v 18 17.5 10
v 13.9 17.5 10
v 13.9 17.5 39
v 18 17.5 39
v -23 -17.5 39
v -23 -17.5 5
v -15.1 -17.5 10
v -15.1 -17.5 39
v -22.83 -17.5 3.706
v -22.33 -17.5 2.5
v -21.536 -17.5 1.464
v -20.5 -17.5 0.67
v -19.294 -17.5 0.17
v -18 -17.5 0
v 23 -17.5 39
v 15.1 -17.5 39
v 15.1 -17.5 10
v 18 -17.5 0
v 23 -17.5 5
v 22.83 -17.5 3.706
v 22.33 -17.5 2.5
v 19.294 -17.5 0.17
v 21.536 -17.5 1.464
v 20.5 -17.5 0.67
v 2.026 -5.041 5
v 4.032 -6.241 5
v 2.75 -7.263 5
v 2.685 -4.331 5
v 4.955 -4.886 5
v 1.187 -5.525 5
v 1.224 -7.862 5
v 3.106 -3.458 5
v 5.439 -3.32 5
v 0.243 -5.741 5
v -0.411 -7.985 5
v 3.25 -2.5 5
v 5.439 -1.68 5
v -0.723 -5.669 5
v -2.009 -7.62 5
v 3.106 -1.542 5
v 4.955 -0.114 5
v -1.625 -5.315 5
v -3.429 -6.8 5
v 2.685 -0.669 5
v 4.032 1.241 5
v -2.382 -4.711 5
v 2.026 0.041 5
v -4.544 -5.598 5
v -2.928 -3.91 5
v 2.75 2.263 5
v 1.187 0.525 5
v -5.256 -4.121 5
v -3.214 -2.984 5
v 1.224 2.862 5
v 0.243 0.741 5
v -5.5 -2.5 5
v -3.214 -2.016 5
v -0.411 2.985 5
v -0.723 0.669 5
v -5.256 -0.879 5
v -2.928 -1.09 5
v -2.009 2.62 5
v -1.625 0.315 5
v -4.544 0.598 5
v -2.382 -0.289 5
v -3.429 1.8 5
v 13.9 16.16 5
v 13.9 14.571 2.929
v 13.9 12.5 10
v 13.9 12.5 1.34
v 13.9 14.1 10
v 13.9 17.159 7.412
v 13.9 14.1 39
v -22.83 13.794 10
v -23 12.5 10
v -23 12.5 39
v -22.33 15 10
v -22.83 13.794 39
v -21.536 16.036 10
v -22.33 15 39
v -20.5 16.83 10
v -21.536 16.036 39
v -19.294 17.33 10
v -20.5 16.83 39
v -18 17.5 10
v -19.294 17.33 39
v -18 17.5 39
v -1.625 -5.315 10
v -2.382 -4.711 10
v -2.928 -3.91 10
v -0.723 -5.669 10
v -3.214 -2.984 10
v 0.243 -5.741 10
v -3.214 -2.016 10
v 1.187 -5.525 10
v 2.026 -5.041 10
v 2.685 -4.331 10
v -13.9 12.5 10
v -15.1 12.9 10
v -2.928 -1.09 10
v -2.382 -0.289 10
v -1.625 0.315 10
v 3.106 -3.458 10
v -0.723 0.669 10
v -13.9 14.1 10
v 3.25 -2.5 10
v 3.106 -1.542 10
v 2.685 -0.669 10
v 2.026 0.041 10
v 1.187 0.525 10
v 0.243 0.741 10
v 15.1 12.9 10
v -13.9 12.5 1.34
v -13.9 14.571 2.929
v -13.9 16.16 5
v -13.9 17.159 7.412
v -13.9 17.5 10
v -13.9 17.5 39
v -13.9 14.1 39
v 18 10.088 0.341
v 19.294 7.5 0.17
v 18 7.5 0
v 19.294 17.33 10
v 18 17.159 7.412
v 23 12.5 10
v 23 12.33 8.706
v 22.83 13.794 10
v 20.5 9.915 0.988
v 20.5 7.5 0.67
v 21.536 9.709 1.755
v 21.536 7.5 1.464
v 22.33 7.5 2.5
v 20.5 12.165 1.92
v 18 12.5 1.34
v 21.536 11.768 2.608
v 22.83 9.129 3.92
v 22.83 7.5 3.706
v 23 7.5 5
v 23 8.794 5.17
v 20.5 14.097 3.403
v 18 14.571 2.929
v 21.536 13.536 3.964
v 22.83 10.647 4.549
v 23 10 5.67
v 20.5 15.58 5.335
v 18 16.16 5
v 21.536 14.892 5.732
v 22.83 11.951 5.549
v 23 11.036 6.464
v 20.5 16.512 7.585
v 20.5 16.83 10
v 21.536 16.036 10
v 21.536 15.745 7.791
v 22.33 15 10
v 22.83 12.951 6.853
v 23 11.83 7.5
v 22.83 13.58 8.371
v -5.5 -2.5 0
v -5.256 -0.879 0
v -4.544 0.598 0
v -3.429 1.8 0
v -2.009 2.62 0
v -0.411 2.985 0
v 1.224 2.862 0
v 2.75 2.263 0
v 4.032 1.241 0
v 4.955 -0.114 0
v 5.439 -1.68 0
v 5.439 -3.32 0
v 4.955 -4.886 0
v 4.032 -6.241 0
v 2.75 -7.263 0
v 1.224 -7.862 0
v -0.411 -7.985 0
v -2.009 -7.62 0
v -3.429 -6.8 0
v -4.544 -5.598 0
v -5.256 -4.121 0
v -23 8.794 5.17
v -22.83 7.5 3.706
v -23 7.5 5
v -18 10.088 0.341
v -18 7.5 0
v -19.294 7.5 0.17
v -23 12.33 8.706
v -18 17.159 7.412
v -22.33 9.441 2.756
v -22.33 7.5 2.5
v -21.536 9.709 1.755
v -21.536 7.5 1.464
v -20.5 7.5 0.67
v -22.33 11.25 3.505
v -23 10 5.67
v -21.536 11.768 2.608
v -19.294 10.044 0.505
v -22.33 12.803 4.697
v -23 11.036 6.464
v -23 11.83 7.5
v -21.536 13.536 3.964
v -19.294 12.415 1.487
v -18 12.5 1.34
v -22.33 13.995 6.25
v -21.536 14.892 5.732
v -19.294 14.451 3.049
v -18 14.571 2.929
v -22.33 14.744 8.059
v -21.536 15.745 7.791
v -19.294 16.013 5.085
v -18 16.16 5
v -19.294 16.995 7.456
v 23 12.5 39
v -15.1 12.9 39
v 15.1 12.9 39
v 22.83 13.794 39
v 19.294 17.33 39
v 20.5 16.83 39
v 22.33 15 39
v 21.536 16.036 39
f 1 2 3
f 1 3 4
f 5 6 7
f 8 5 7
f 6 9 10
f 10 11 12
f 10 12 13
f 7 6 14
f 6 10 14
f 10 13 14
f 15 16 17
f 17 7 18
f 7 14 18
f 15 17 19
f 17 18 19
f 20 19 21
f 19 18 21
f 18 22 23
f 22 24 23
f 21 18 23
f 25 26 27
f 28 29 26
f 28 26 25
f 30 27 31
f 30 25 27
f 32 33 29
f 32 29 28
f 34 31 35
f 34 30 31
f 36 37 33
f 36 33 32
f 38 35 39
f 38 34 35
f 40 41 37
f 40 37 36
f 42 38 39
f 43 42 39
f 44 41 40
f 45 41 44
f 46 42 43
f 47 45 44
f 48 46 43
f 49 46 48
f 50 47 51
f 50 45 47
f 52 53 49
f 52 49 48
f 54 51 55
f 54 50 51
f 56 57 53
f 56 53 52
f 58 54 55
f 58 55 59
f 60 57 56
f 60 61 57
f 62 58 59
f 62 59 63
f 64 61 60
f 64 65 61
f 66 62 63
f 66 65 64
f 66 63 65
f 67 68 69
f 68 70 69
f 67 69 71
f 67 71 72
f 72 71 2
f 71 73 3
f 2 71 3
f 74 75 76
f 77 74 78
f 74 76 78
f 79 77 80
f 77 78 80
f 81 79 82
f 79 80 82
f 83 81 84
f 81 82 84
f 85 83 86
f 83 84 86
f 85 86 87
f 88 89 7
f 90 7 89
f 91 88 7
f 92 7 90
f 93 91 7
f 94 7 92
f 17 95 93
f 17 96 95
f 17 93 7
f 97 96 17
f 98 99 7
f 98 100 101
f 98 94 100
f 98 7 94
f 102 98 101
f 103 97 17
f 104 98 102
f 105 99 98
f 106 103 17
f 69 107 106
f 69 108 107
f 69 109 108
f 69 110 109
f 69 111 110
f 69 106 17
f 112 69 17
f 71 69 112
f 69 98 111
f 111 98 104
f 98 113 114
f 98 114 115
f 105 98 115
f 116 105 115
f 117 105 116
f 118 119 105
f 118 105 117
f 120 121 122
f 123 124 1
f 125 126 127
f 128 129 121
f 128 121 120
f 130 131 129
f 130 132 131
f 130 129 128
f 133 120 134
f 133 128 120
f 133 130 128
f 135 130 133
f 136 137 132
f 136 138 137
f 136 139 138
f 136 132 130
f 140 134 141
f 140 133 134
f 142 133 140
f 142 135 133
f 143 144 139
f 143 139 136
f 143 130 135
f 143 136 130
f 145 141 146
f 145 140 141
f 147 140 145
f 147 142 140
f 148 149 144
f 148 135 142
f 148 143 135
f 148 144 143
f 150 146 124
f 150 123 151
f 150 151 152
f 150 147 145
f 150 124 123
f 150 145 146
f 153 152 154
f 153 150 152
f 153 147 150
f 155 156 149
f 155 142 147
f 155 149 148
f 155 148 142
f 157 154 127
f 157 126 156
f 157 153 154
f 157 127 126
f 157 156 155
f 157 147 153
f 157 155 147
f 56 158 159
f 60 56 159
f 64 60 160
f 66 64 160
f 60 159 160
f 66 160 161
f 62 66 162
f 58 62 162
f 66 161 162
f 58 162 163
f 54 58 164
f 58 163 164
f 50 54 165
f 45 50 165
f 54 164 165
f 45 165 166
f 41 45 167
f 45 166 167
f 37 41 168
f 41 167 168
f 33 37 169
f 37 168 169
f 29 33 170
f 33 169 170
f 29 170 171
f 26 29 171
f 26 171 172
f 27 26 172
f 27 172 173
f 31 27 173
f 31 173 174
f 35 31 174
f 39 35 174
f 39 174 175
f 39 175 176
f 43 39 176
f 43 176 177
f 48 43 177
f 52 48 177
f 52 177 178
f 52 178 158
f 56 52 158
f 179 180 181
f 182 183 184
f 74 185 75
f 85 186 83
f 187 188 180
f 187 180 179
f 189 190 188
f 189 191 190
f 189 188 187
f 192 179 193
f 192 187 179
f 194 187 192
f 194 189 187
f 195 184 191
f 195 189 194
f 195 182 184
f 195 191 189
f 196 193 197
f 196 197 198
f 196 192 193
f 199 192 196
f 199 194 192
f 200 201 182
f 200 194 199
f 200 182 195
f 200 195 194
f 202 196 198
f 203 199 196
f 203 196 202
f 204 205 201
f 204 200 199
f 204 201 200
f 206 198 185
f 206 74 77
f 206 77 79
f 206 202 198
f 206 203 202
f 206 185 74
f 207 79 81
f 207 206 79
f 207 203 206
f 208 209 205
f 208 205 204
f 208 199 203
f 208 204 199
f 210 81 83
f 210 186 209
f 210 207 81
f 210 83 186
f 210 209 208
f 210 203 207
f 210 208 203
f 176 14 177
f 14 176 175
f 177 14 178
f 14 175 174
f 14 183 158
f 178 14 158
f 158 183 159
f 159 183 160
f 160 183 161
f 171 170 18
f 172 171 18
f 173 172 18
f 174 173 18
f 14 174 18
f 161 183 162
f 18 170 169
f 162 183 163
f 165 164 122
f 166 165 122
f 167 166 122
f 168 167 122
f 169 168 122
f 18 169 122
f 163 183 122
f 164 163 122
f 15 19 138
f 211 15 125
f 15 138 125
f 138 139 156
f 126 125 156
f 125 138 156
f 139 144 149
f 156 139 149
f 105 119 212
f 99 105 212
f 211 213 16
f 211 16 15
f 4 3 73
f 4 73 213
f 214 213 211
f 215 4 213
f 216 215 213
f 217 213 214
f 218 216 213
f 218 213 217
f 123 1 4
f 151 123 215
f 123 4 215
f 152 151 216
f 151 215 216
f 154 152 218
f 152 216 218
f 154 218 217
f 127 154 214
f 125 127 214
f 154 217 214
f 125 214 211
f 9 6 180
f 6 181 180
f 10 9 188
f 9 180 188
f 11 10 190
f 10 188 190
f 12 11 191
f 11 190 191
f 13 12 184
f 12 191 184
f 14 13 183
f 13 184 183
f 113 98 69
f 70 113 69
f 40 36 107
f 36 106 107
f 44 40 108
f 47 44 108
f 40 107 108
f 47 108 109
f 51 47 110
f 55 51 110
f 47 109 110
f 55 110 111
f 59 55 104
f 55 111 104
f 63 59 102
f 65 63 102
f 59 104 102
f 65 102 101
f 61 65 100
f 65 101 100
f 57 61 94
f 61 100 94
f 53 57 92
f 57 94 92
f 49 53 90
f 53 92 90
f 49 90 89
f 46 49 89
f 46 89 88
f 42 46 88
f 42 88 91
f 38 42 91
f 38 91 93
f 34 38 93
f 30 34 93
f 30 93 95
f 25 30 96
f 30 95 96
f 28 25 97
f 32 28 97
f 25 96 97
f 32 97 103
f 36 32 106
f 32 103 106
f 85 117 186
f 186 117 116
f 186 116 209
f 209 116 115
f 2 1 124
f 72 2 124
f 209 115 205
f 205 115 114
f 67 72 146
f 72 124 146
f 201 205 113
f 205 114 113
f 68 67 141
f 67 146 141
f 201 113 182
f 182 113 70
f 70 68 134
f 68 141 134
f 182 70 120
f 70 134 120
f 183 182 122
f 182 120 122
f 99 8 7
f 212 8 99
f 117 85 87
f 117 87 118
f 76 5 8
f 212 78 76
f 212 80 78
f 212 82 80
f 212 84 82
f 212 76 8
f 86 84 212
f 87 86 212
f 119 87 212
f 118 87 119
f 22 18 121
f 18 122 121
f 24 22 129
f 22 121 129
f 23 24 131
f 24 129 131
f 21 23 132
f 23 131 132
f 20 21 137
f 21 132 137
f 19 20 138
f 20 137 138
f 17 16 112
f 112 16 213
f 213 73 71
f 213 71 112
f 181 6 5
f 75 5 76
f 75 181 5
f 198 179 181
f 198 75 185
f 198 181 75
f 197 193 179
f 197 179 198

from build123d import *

# Parameters (mm, degrees)
SKETCH_1_W                   = 46
SKETCH_1_H                   = 35
EXTRUDE_1_DEPTH              = 39
SKETCH_2_W                   = 30.2
SKETCH_2_H                   = 30
CUT_EXTRUDE_1_DEPTH          = 29
SKETCH_4_W                   = 27.8
SKETCH_4_H                   = 10
CUT_EXTRUDE_2_DEPTH          = 49.541219597
HOLE_WIZARD_M6_2_D           = 6.5
HOLE_WIZARD_M6_2_CBORE_D     = 11
HOLE_WIZARD_M6_2_CBORE_DEPTH = 5
CHAMFER_1_SIZE               = 1.6
FILLET_3_R                   = 10
FILLET_4_R                   = 5


with BuildPart() as part:
    # 草图1 → 凸台-拉伸1 (new body)
    with BuildSketch(Plane.XY):
        Rectangle(SKETCH_1_W, SKETCH_1_H)
    extrude(amount=EXTRUDE_1_DEPTH)

    # 草图2 → 切除-拉伸1 (cut)
    with BuildSketch(Plane.XY.offset(39)):
        with Locations((0, -2.5)):
            Rectangle(SKETCH_2_W, SKETCH_2_H)
    extrude(amount=-CUT_EXTRUDE_1_DEPTH, mode=Mode.SUBTRACT)

    # 草图4 → 切除-拉伸2 (cut, through all)
    with BuildSketch(Plane.XY.offset(39)):
        with Locations((0, 17.5)):
            Rectangle(SKETCH_4_W, SKETCH_4_H)
    extrude(amount=-CUT_EXTRUDE_2_DEPTH, mode=Mode.SUBTRACT)

    # M6 凹头盖螺钉的柱形沉头孔2 (through all)
    with Locations(Plane(origin=(0, 0, 0), x_dir=(-1, 0, 0), z_dir=(0, 0, -1))):
        with Locations((0, -2.5)):
            CounterBoreHole(HOLE_WIZARD_M6_2_D / 2, HOLE_WIZARD_M6_2_CBORE_D / 2, HOLE_WIZARD_M6_2_CBORE_DEPTH)

    # 倒角1
    # the kernel refuses this chamfer: 1.6 mm, written as the material it takes off along each edge
    with BuildSketch(Plane(origin=(13.9, 12.5, 43.114692781), x_dir=(-0.027495876610586285, 0.9996219169112968, 0), z_dir=(0, 0, -1))) as chamfer_1_piece_1_section:
        Polygon((CHAMFER_1_SIZE * 0.999621916911, CHAMFER_1_SIZE * 0.0274958766106), (-CHAMFER_1_SIZE * 0.0274958766106, CHAMFER_1_SIZE * 0.999621916911), (0, 0), align=None)
    chamfer_1_piece_1 = extrude(amount=33.114692781, mode=Mode.PRIVATE)
    chamfer_1_piece_1 = split(chamfer_1_piece_1, bisect_by=Plane(origin=(15.1, 13.06, 24.5), z_dir=(-1, 0, 0)), keep=Keep.TOP, mode=Mode.PRIVATE)
    add(chamfer_1_piece_1, mode=Mode.SUBTRACT)
    with BuildSketch(Plane(origin=(-13.9, 12.5, 43.114692781), x_dir=(0.027495876610586285, 0.9996219169112968, 0), z_dir=(0, 0, -1))) as chamfer_1_piece_2_section:
        Polygon((CHAMFER_1_SIZE * 0.999621916911, -CHAMFER_1_SIZE * 0.0274958766106), (-CHAMFER_1_SIZE * 0.0274958766106, -CHAMFER_1_SIZE * 0.999621916911), (0, 0), align=None)
    chamfer_1_piece_2 = extrude(amount=33.114692781, mode=Mode.PRIVATE)
    chamfer_1_piece_2 = split(chamfer_1_piece_2, bisect_by=Plane(origin=(-15.1, 13.06, 24.5), z_dir=(1, 0, 0)), keep=Keep.TOP, mode=Mode.PRIVATE)
    add(chamfer_1_piece_2, mode=Mode.SUBTRACT)

    # 圆角3
    fillet_3_edges = [part.edges().sort_by_distance(p)[0] for p in [
        (18.45, 17.5, 0),
    ]]
    fillet(fillet_3_edges, radius=FILLET_3_R)

    # 圆角4
    fillet_4_edges = [part.edges().sort_by_distance(p)[0] for p in [
        (23, -5, 0),
        (-23, 17.5, 24.499999812),
        (23, 17.5, 24.5),
        (-23, -5, 0),
        (-23, 14.571067679, 2.928932055),
        (23, 14.571067812, 2.928932188),
    ]]
    fillet(fillet_4_edges, radius=FILLET_4_R)


solid = part.part
